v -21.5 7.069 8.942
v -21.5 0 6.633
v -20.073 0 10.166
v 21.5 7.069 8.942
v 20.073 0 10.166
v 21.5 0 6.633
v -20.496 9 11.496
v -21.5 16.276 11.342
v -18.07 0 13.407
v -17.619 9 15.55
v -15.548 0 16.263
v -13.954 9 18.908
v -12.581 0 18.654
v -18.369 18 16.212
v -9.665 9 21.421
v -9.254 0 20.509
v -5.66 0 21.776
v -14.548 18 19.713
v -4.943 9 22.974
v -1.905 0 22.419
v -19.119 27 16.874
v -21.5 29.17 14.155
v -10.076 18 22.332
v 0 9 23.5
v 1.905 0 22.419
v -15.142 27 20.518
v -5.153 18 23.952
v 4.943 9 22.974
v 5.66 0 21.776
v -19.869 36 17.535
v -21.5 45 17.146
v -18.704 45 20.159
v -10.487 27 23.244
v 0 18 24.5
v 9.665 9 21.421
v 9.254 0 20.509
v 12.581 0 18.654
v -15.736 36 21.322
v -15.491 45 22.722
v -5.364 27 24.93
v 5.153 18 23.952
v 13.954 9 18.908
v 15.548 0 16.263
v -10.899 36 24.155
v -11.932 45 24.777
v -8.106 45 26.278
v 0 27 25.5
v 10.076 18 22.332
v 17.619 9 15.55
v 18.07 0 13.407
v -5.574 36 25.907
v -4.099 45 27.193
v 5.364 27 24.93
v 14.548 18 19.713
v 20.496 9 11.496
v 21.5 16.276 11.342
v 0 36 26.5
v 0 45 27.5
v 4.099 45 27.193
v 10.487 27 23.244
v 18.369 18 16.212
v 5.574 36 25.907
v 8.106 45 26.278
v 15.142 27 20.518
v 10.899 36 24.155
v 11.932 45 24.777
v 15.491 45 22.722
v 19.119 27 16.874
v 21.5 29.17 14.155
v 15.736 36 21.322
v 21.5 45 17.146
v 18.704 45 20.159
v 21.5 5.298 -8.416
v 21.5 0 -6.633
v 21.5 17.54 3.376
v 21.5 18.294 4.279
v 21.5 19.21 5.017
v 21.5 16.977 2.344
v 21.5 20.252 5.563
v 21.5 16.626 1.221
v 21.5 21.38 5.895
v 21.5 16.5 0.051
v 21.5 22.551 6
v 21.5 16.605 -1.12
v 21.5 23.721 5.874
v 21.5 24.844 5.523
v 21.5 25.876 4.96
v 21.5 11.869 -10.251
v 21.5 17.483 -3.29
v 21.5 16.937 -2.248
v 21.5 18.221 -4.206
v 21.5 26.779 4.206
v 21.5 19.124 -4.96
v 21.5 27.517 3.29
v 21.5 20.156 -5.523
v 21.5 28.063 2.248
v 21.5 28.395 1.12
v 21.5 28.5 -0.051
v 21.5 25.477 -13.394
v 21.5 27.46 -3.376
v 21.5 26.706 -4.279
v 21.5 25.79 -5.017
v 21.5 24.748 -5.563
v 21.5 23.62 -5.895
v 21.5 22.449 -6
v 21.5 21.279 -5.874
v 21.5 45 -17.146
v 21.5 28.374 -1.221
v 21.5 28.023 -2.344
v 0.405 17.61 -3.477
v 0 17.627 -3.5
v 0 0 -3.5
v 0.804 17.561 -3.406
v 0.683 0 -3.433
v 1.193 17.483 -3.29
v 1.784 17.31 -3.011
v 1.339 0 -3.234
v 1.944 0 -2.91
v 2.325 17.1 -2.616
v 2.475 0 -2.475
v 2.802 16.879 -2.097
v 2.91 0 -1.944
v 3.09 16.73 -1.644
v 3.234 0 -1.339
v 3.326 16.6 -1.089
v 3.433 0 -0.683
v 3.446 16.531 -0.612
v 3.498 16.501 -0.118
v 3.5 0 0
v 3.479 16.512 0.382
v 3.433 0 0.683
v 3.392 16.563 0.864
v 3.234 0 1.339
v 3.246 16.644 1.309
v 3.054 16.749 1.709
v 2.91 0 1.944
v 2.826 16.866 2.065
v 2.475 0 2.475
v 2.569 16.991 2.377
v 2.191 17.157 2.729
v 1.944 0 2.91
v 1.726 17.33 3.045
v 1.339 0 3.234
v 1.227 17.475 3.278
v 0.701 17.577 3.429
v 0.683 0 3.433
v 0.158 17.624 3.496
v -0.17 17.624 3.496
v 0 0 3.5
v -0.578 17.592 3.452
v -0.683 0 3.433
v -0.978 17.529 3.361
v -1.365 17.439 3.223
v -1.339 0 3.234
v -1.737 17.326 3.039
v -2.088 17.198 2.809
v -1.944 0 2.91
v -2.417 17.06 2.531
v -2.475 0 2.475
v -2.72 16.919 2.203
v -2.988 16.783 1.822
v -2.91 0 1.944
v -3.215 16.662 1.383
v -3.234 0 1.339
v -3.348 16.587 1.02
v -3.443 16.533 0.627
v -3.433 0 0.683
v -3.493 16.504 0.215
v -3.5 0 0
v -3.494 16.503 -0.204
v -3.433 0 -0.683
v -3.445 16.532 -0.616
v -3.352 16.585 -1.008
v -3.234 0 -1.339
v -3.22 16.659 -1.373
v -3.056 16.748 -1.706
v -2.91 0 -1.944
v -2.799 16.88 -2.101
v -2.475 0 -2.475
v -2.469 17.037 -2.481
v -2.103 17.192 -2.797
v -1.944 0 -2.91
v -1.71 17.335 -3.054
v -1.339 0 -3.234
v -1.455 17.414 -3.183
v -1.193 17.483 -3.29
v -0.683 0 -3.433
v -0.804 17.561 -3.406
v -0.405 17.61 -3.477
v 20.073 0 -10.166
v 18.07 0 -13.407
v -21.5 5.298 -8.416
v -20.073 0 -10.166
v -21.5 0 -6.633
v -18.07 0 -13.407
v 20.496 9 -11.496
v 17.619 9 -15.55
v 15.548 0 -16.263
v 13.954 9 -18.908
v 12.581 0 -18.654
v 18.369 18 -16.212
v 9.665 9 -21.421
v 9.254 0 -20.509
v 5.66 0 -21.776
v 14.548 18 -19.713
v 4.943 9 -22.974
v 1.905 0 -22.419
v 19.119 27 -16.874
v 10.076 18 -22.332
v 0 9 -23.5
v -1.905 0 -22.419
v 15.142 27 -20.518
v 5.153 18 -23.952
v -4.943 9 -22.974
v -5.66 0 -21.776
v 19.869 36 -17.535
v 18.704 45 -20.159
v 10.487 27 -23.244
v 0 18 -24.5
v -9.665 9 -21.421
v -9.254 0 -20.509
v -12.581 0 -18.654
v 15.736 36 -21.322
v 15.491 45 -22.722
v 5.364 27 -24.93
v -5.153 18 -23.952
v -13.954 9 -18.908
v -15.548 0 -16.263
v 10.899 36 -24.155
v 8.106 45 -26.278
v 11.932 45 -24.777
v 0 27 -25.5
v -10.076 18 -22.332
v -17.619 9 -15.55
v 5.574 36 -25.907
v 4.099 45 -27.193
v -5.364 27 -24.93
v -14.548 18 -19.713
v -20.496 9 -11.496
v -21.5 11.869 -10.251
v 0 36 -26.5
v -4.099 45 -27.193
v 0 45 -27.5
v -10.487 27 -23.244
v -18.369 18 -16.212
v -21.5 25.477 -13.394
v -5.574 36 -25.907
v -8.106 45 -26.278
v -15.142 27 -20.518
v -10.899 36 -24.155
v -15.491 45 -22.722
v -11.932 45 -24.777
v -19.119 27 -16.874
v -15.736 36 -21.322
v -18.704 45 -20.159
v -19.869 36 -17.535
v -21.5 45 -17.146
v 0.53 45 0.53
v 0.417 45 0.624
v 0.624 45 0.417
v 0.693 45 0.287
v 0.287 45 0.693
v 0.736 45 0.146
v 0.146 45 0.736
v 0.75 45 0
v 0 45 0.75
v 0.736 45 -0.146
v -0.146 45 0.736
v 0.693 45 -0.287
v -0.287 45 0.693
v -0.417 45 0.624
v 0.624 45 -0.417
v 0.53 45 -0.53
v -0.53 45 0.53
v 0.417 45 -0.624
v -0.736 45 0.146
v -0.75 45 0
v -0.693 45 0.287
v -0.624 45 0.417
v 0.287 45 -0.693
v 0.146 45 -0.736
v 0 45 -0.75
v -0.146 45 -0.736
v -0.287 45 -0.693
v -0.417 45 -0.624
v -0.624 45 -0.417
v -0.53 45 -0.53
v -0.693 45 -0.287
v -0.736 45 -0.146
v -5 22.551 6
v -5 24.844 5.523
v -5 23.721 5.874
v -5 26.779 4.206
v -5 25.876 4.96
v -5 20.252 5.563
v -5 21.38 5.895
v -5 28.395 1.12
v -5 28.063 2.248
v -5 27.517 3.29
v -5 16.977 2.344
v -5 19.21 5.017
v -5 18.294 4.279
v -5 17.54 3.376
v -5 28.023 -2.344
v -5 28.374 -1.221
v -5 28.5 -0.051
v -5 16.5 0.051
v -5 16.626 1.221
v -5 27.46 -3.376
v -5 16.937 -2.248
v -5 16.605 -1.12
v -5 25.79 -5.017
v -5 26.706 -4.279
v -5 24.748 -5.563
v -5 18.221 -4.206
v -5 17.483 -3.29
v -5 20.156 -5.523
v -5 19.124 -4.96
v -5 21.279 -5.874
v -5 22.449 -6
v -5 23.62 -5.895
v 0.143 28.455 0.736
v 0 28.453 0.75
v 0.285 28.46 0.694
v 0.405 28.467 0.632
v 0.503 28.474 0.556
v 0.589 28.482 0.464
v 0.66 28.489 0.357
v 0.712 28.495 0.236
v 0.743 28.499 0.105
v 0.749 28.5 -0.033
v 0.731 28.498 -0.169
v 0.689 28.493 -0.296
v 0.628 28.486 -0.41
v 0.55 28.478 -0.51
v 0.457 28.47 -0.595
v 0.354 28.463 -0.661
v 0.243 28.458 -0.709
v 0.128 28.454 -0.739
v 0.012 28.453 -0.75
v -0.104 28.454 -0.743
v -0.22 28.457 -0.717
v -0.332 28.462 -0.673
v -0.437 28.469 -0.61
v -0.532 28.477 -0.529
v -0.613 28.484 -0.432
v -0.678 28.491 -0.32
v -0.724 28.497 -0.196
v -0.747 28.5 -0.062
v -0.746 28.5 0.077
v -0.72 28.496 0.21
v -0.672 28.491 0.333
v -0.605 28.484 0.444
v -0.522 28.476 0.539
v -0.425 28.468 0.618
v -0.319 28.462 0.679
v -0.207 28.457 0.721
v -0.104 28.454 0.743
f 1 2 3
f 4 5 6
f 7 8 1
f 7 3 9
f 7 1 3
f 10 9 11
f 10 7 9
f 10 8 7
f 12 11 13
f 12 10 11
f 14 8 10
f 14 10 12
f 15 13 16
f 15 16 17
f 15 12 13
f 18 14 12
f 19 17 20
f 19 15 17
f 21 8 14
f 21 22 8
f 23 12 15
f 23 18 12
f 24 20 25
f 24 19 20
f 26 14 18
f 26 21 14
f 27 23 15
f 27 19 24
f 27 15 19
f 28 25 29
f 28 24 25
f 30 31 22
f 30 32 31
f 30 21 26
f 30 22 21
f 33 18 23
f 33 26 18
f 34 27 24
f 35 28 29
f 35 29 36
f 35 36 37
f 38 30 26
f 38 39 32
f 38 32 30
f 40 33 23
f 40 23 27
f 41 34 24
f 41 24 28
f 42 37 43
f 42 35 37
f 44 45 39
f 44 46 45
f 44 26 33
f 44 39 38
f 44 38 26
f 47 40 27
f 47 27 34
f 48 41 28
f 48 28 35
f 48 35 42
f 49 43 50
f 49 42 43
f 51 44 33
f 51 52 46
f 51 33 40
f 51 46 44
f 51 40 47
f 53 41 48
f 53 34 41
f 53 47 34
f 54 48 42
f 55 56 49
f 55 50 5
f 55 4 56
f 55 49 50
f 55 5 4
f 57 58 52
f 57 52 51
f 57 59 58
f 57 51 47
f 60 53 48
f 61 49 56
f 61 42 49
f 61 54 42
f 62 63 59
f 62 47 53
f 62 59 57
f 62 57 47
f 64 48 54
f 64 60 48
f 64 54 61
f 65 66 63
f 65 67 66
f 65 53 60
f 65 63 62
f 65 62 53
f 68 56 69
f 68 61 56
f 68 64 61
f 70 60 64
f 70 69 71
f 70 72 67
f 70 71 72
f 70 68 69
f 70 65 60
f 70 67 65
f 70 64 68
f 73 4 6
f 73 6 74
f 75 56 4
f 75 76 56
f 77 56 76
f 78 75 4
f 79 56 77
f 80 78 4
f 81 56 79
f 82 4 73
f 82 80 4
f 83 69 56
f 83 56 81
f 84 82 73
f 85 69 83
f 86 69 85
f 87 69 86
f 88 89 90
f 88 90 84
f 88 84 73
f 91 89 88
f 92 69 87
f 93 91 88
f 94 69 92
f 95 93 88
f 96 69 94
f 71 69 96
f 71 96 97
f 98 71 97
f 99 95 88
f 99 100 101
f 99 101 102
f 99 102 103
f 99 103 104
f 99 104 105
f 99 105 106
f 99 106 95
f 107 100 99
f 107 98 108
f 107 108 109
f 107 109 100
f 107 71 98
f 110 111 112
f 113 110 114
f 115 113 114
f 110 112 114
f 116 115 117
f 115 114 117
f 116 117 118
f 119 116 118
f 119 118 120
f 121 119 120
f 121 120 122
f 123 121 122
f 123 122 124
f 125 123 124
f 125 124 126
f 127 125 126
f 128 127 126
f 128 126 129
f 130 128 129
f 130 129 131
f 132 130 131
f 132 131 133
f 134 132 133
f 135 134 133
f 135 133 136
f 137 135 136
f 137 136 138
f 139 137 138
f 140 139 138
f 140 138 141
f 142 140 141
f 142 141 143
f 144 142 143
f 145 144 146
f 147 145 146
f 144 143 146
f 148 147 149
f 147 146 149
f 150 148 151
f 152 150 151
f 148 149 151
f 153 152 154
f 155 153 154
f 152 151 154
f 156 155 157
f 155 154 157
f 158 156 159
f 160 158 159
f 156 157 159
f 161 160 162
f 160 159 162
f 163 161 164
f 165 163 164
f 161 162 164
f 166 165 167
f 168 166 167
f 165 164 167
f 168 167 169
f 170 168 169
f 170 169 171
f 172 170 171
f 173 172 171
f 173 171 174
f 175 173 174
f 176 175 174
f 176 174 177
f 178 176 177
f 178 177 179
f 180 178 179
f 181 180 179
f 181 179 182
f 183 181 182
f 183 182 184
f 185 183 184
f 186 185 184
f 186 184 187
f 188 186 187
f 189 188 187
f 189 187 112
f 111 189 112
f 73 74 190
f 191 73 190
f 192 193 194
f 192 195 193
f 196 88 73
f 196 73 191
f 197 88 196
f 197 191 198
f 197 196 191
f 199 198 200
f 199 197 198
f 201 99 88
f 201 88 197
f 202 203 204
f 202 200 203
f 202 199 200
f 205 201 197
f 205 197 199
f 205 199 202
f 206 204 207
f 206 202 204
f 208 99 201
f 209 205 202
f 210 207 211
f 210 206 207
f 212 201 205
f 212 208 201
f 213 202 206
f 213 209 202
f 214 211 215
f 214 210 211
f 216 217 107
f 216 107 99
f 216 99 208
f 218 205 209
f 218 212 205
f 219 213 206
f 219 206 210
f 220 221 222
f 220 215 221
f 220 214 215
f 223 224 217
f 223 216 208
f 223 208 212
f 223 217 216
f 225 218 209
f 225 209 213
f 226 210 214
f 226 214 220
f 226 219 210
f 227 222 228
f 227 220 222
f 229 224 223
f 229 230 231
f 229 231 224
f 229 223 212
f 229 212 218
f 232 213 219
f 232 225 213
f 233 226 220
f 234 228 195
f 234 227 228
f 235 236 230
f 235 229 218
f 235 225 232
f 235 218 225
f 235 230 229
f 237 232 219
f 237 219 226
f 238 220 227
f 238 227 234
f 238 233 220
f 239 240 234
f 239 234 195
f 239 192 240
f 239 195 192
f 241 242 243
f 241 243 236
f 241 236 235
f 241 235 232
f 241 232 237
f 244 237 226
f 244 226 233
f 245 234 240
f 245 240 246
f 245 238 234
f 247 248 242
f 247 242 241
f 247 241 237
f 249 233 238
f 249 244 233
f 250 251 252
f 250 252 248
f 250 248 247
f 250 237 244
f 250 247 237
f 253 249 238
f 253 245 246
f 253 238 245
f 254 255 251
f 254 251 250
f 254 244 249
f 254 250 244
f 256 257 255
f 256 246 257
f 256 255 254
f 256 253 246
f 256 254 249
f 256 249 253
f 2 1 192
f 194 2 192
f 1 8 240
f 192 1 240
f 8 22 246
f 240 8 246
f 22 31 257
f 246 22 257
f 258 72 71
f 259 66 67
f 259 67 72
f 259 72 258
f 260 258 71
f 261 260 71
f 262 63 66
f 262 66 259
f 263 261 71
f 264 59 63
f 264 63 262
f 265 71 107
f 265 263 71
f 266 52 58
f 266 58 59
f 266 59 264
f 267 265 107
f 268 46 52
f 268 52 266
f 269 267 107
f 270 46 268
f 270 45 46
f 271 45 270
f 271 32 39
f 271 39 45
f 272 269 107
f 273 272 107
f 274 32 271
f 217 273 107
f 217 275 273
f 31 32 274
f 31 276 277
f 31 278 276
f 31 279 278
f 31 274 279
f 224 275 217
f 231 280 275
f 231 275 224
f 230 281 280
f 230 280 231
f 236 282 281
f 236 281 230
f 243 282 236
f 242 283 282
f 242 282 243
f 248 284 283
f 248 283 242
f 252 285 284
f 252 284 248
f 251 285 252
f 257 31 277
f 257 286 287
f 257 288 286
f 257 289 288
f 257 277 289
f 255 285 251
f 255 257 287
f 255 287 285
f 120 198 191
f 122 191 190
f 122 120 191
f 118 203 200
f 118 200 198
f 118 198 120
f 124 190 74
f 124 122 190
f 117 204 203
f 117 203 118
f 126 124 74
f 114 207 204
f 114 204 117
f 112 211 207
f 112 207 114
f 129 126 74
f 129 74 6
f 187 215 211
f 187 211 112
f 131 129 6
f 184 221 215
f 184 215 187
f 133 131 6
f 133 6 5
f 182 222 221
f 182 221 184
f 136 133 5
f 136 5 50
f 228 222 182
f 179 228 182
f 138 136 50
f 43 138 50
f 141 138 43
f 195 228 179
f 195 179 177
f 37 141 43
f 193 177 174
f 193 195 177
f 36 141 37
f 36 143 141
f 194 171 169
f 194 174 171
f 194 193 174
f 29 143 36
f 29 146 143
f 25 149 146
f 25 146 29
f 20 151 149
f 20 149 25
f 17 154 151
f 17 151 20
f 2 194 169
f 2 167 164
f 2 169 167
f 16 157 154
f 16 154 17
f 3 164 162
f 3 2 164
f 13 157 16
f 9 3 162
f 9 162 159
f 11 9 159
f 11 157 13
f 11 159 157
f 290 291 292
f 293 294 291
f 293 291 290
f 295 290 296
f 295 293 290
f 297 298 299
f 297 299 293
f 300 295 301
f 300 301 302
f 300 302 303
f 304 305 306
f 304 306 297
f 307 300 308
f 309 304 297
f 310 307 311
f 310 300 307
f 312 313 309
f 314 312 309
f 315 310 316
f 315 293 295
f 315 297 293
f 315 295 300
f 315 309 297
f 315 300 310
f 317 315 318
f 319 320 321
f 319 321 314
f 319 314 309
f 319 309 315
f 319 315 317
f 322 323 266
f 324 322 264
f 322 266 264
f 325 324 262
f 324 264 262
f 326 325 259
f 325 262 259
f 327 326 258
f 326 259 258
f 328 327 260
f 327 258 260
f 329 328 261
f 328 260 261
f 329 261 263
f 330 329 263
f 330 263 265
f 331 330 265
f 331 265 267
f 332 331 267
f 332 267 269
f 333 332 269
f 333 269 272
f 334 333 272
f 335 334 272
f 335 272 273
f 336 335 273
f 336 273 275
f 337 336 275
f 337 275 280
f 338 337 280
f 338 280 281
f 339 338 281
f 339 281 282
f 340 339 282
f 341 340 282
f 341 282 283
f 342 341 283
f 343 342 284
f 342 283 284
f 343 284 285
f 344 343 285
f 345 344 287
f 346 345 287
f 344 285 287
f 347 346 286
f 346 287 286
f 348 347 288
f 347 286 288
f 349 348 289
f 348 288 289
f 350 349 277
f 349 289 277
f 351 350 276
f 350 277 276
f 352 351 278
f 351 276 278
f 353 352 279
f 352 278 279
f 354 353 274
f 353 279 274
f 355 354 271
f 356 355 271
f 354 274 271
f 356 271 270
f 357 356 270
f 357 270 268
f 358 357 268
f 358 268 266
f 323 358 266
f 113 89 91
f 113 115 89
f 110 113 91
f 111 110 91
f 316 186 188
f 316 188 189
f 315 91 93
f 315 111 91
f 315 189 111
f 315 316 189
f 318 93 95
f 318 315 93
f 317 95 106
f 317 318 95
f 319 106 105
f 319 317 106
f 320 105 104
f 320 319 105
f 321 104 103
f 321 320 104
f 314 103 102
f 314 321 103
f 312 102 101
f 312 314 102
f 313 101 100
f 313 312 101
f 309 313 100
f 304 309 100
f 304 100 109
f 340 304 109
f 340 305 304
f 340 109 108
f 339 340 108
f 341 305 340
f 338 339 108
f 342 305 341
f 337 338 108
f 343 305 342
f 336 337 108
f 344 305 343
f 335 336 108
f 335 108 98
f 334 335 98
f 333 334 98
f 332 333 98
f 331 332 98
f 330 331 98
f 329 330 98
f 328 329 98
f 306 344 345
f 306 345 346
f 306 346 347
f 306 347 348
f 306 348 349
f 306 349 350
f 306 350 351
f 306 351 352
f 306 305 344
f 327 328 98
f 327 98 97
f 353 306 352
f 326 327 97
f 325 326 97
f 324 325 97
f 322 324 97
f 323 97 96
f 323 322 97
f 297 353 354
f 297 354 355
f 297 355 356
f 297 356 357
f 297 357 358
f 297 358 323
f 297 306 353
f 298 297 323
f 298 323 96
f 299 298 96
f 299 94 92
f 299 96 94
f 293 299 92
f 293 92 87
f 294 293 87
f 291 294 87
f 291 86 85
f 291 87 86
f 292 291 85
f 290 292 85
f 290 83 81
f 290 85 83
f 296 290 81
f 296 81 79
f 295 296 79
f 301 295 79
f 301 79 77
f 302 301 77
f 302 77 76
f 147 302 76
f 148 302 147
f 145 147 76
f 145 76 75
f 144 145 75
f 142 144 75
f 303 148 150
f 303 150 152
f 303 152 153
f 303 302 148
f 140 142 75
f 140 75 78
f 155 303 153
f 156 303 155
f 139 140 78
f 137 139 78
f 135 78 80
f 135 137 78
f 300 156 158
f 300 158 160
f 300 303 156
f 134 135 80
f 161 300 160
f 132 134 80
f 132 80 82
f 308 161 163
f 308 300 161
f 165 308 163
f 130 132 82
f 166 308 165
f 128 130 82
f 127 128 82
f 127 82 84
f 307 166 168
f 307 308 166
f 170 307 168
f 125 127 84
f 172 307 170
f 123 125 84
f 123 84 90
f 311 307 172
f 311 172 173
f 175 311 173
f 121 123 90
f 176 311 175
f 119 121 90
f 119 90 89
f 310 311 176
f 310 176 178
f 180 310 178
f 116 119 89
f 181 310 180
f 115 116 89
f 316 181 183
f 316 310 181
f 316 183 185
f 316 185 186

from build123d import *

# Parameters (mm, degrees)
SKIZZE2_R                            = 0.75
SCHNITT_LINEAR_AUSTRAGEN1_DEPTH      = 60.476886267
SKIZZE3_R                            = 3.5
SCHNITT_LINEAR_AUSTRAGEN2_DEPTH      = 25
SCHNITT_LINEAR_AUSTRAGEN3_DEPTH      = 60.476886267
SCHNITT_LINEAR_AUSTRAGEN3_DEPTH_BACK = 5
SKIZZE4_R                            = 6
SKIZZE5_W                            = 10
SKIZZE5_H                            = 60
SCHNITT_LINEAR_AUSTRAGEN4_DEPTH      = 60.476886435


with BuildPart() as part:
    # Skizze1 → Rotation1 (revolve)
    with BuildSketch(Plane.XY, mode=Mode.PRIVATE) as rotation1_sk:
        Polygon((0, 0), (-22.5, 0), (-27.5, 45), (0, 45), align=None)
    revolve(rotation1_sk.sketch.rotate(Axis((0, 0, 0), (0, 1, 0)), 270), axis=Axis((0, 0, 0), (0, 1, 0)))

    # Skizze2 → Schnitt-Linear austragen1 (cut, through all)
    with BuildSketch(Plane(origin=(0, 45, 0), x_dir=(1, 0, 0), z_dir=(0, 1, 0))):
        with Locations(Location((0, 0, 0), (0, 0, 270))):
            Circle(SKIZZE2_R)
    extrude(amount=-SCHNITT_LINEAR_AUSTRAGEN1_DEPTH, mode=Mode.SUBTRACT)

    # Skizze3 → Schnitt-Linear austragen2 (cut)
    with BuildSketch(Plane.XZ):
        with Locations(Location((0, 0, 0), (0, 0, 270))):
            Circle(SKIZZE3_R)
    extrude(amount=-SCHNITT_LINEAR_AUSTRAGEN2_DEPTH, mode=Mode.SUBTRACT)

    # Skizze4 → Schnitt-Linear austragen3 (cut, two sides: drawn at the far end of the back side and taken through both)
    with BuildSketch(Plane(origin=(0, 0, 0), x_dir=(0, 0, -1), z_dir=(1, 0, 0)).offset(-SCHNITT_LINEAR_AUSTRAGEN3_DEPTH_BACK)):
        with Locations(Location((0, 22.5, 0), (0, 0, 303.25844047))):
            Circle(SKIZZE4_R)
    extrude(amount=SCHNITT_LINEAR_AUSTRAGEN3_DEPTH + SCHNITT_LINEAR_AUSTRAGEN3_DEPTH_BACK, mode=Mode.SUBTRACT)

    # Skizze5 → Schnitt-Linear austragen4 (cut, through all)
    with BuildSketch(Plane(origin=(0, 45, 0), x_dir=(1, 0, 0), z_dir=(0, 1, 0))):
        with Locations((-26.5, 0)):
            Rectangle(SKIZZE5_W, SKIZZE5_H)
        with Locations((26.5, 0)):
            Rectangle(SKIZZE5_W, SKIZZE5_H)
    extrude(amount=-SCHNITT_LINEAR_AUSTRAGEN4_DEPTH, mode=Mode.SUBTRACT)


solid = part.part
